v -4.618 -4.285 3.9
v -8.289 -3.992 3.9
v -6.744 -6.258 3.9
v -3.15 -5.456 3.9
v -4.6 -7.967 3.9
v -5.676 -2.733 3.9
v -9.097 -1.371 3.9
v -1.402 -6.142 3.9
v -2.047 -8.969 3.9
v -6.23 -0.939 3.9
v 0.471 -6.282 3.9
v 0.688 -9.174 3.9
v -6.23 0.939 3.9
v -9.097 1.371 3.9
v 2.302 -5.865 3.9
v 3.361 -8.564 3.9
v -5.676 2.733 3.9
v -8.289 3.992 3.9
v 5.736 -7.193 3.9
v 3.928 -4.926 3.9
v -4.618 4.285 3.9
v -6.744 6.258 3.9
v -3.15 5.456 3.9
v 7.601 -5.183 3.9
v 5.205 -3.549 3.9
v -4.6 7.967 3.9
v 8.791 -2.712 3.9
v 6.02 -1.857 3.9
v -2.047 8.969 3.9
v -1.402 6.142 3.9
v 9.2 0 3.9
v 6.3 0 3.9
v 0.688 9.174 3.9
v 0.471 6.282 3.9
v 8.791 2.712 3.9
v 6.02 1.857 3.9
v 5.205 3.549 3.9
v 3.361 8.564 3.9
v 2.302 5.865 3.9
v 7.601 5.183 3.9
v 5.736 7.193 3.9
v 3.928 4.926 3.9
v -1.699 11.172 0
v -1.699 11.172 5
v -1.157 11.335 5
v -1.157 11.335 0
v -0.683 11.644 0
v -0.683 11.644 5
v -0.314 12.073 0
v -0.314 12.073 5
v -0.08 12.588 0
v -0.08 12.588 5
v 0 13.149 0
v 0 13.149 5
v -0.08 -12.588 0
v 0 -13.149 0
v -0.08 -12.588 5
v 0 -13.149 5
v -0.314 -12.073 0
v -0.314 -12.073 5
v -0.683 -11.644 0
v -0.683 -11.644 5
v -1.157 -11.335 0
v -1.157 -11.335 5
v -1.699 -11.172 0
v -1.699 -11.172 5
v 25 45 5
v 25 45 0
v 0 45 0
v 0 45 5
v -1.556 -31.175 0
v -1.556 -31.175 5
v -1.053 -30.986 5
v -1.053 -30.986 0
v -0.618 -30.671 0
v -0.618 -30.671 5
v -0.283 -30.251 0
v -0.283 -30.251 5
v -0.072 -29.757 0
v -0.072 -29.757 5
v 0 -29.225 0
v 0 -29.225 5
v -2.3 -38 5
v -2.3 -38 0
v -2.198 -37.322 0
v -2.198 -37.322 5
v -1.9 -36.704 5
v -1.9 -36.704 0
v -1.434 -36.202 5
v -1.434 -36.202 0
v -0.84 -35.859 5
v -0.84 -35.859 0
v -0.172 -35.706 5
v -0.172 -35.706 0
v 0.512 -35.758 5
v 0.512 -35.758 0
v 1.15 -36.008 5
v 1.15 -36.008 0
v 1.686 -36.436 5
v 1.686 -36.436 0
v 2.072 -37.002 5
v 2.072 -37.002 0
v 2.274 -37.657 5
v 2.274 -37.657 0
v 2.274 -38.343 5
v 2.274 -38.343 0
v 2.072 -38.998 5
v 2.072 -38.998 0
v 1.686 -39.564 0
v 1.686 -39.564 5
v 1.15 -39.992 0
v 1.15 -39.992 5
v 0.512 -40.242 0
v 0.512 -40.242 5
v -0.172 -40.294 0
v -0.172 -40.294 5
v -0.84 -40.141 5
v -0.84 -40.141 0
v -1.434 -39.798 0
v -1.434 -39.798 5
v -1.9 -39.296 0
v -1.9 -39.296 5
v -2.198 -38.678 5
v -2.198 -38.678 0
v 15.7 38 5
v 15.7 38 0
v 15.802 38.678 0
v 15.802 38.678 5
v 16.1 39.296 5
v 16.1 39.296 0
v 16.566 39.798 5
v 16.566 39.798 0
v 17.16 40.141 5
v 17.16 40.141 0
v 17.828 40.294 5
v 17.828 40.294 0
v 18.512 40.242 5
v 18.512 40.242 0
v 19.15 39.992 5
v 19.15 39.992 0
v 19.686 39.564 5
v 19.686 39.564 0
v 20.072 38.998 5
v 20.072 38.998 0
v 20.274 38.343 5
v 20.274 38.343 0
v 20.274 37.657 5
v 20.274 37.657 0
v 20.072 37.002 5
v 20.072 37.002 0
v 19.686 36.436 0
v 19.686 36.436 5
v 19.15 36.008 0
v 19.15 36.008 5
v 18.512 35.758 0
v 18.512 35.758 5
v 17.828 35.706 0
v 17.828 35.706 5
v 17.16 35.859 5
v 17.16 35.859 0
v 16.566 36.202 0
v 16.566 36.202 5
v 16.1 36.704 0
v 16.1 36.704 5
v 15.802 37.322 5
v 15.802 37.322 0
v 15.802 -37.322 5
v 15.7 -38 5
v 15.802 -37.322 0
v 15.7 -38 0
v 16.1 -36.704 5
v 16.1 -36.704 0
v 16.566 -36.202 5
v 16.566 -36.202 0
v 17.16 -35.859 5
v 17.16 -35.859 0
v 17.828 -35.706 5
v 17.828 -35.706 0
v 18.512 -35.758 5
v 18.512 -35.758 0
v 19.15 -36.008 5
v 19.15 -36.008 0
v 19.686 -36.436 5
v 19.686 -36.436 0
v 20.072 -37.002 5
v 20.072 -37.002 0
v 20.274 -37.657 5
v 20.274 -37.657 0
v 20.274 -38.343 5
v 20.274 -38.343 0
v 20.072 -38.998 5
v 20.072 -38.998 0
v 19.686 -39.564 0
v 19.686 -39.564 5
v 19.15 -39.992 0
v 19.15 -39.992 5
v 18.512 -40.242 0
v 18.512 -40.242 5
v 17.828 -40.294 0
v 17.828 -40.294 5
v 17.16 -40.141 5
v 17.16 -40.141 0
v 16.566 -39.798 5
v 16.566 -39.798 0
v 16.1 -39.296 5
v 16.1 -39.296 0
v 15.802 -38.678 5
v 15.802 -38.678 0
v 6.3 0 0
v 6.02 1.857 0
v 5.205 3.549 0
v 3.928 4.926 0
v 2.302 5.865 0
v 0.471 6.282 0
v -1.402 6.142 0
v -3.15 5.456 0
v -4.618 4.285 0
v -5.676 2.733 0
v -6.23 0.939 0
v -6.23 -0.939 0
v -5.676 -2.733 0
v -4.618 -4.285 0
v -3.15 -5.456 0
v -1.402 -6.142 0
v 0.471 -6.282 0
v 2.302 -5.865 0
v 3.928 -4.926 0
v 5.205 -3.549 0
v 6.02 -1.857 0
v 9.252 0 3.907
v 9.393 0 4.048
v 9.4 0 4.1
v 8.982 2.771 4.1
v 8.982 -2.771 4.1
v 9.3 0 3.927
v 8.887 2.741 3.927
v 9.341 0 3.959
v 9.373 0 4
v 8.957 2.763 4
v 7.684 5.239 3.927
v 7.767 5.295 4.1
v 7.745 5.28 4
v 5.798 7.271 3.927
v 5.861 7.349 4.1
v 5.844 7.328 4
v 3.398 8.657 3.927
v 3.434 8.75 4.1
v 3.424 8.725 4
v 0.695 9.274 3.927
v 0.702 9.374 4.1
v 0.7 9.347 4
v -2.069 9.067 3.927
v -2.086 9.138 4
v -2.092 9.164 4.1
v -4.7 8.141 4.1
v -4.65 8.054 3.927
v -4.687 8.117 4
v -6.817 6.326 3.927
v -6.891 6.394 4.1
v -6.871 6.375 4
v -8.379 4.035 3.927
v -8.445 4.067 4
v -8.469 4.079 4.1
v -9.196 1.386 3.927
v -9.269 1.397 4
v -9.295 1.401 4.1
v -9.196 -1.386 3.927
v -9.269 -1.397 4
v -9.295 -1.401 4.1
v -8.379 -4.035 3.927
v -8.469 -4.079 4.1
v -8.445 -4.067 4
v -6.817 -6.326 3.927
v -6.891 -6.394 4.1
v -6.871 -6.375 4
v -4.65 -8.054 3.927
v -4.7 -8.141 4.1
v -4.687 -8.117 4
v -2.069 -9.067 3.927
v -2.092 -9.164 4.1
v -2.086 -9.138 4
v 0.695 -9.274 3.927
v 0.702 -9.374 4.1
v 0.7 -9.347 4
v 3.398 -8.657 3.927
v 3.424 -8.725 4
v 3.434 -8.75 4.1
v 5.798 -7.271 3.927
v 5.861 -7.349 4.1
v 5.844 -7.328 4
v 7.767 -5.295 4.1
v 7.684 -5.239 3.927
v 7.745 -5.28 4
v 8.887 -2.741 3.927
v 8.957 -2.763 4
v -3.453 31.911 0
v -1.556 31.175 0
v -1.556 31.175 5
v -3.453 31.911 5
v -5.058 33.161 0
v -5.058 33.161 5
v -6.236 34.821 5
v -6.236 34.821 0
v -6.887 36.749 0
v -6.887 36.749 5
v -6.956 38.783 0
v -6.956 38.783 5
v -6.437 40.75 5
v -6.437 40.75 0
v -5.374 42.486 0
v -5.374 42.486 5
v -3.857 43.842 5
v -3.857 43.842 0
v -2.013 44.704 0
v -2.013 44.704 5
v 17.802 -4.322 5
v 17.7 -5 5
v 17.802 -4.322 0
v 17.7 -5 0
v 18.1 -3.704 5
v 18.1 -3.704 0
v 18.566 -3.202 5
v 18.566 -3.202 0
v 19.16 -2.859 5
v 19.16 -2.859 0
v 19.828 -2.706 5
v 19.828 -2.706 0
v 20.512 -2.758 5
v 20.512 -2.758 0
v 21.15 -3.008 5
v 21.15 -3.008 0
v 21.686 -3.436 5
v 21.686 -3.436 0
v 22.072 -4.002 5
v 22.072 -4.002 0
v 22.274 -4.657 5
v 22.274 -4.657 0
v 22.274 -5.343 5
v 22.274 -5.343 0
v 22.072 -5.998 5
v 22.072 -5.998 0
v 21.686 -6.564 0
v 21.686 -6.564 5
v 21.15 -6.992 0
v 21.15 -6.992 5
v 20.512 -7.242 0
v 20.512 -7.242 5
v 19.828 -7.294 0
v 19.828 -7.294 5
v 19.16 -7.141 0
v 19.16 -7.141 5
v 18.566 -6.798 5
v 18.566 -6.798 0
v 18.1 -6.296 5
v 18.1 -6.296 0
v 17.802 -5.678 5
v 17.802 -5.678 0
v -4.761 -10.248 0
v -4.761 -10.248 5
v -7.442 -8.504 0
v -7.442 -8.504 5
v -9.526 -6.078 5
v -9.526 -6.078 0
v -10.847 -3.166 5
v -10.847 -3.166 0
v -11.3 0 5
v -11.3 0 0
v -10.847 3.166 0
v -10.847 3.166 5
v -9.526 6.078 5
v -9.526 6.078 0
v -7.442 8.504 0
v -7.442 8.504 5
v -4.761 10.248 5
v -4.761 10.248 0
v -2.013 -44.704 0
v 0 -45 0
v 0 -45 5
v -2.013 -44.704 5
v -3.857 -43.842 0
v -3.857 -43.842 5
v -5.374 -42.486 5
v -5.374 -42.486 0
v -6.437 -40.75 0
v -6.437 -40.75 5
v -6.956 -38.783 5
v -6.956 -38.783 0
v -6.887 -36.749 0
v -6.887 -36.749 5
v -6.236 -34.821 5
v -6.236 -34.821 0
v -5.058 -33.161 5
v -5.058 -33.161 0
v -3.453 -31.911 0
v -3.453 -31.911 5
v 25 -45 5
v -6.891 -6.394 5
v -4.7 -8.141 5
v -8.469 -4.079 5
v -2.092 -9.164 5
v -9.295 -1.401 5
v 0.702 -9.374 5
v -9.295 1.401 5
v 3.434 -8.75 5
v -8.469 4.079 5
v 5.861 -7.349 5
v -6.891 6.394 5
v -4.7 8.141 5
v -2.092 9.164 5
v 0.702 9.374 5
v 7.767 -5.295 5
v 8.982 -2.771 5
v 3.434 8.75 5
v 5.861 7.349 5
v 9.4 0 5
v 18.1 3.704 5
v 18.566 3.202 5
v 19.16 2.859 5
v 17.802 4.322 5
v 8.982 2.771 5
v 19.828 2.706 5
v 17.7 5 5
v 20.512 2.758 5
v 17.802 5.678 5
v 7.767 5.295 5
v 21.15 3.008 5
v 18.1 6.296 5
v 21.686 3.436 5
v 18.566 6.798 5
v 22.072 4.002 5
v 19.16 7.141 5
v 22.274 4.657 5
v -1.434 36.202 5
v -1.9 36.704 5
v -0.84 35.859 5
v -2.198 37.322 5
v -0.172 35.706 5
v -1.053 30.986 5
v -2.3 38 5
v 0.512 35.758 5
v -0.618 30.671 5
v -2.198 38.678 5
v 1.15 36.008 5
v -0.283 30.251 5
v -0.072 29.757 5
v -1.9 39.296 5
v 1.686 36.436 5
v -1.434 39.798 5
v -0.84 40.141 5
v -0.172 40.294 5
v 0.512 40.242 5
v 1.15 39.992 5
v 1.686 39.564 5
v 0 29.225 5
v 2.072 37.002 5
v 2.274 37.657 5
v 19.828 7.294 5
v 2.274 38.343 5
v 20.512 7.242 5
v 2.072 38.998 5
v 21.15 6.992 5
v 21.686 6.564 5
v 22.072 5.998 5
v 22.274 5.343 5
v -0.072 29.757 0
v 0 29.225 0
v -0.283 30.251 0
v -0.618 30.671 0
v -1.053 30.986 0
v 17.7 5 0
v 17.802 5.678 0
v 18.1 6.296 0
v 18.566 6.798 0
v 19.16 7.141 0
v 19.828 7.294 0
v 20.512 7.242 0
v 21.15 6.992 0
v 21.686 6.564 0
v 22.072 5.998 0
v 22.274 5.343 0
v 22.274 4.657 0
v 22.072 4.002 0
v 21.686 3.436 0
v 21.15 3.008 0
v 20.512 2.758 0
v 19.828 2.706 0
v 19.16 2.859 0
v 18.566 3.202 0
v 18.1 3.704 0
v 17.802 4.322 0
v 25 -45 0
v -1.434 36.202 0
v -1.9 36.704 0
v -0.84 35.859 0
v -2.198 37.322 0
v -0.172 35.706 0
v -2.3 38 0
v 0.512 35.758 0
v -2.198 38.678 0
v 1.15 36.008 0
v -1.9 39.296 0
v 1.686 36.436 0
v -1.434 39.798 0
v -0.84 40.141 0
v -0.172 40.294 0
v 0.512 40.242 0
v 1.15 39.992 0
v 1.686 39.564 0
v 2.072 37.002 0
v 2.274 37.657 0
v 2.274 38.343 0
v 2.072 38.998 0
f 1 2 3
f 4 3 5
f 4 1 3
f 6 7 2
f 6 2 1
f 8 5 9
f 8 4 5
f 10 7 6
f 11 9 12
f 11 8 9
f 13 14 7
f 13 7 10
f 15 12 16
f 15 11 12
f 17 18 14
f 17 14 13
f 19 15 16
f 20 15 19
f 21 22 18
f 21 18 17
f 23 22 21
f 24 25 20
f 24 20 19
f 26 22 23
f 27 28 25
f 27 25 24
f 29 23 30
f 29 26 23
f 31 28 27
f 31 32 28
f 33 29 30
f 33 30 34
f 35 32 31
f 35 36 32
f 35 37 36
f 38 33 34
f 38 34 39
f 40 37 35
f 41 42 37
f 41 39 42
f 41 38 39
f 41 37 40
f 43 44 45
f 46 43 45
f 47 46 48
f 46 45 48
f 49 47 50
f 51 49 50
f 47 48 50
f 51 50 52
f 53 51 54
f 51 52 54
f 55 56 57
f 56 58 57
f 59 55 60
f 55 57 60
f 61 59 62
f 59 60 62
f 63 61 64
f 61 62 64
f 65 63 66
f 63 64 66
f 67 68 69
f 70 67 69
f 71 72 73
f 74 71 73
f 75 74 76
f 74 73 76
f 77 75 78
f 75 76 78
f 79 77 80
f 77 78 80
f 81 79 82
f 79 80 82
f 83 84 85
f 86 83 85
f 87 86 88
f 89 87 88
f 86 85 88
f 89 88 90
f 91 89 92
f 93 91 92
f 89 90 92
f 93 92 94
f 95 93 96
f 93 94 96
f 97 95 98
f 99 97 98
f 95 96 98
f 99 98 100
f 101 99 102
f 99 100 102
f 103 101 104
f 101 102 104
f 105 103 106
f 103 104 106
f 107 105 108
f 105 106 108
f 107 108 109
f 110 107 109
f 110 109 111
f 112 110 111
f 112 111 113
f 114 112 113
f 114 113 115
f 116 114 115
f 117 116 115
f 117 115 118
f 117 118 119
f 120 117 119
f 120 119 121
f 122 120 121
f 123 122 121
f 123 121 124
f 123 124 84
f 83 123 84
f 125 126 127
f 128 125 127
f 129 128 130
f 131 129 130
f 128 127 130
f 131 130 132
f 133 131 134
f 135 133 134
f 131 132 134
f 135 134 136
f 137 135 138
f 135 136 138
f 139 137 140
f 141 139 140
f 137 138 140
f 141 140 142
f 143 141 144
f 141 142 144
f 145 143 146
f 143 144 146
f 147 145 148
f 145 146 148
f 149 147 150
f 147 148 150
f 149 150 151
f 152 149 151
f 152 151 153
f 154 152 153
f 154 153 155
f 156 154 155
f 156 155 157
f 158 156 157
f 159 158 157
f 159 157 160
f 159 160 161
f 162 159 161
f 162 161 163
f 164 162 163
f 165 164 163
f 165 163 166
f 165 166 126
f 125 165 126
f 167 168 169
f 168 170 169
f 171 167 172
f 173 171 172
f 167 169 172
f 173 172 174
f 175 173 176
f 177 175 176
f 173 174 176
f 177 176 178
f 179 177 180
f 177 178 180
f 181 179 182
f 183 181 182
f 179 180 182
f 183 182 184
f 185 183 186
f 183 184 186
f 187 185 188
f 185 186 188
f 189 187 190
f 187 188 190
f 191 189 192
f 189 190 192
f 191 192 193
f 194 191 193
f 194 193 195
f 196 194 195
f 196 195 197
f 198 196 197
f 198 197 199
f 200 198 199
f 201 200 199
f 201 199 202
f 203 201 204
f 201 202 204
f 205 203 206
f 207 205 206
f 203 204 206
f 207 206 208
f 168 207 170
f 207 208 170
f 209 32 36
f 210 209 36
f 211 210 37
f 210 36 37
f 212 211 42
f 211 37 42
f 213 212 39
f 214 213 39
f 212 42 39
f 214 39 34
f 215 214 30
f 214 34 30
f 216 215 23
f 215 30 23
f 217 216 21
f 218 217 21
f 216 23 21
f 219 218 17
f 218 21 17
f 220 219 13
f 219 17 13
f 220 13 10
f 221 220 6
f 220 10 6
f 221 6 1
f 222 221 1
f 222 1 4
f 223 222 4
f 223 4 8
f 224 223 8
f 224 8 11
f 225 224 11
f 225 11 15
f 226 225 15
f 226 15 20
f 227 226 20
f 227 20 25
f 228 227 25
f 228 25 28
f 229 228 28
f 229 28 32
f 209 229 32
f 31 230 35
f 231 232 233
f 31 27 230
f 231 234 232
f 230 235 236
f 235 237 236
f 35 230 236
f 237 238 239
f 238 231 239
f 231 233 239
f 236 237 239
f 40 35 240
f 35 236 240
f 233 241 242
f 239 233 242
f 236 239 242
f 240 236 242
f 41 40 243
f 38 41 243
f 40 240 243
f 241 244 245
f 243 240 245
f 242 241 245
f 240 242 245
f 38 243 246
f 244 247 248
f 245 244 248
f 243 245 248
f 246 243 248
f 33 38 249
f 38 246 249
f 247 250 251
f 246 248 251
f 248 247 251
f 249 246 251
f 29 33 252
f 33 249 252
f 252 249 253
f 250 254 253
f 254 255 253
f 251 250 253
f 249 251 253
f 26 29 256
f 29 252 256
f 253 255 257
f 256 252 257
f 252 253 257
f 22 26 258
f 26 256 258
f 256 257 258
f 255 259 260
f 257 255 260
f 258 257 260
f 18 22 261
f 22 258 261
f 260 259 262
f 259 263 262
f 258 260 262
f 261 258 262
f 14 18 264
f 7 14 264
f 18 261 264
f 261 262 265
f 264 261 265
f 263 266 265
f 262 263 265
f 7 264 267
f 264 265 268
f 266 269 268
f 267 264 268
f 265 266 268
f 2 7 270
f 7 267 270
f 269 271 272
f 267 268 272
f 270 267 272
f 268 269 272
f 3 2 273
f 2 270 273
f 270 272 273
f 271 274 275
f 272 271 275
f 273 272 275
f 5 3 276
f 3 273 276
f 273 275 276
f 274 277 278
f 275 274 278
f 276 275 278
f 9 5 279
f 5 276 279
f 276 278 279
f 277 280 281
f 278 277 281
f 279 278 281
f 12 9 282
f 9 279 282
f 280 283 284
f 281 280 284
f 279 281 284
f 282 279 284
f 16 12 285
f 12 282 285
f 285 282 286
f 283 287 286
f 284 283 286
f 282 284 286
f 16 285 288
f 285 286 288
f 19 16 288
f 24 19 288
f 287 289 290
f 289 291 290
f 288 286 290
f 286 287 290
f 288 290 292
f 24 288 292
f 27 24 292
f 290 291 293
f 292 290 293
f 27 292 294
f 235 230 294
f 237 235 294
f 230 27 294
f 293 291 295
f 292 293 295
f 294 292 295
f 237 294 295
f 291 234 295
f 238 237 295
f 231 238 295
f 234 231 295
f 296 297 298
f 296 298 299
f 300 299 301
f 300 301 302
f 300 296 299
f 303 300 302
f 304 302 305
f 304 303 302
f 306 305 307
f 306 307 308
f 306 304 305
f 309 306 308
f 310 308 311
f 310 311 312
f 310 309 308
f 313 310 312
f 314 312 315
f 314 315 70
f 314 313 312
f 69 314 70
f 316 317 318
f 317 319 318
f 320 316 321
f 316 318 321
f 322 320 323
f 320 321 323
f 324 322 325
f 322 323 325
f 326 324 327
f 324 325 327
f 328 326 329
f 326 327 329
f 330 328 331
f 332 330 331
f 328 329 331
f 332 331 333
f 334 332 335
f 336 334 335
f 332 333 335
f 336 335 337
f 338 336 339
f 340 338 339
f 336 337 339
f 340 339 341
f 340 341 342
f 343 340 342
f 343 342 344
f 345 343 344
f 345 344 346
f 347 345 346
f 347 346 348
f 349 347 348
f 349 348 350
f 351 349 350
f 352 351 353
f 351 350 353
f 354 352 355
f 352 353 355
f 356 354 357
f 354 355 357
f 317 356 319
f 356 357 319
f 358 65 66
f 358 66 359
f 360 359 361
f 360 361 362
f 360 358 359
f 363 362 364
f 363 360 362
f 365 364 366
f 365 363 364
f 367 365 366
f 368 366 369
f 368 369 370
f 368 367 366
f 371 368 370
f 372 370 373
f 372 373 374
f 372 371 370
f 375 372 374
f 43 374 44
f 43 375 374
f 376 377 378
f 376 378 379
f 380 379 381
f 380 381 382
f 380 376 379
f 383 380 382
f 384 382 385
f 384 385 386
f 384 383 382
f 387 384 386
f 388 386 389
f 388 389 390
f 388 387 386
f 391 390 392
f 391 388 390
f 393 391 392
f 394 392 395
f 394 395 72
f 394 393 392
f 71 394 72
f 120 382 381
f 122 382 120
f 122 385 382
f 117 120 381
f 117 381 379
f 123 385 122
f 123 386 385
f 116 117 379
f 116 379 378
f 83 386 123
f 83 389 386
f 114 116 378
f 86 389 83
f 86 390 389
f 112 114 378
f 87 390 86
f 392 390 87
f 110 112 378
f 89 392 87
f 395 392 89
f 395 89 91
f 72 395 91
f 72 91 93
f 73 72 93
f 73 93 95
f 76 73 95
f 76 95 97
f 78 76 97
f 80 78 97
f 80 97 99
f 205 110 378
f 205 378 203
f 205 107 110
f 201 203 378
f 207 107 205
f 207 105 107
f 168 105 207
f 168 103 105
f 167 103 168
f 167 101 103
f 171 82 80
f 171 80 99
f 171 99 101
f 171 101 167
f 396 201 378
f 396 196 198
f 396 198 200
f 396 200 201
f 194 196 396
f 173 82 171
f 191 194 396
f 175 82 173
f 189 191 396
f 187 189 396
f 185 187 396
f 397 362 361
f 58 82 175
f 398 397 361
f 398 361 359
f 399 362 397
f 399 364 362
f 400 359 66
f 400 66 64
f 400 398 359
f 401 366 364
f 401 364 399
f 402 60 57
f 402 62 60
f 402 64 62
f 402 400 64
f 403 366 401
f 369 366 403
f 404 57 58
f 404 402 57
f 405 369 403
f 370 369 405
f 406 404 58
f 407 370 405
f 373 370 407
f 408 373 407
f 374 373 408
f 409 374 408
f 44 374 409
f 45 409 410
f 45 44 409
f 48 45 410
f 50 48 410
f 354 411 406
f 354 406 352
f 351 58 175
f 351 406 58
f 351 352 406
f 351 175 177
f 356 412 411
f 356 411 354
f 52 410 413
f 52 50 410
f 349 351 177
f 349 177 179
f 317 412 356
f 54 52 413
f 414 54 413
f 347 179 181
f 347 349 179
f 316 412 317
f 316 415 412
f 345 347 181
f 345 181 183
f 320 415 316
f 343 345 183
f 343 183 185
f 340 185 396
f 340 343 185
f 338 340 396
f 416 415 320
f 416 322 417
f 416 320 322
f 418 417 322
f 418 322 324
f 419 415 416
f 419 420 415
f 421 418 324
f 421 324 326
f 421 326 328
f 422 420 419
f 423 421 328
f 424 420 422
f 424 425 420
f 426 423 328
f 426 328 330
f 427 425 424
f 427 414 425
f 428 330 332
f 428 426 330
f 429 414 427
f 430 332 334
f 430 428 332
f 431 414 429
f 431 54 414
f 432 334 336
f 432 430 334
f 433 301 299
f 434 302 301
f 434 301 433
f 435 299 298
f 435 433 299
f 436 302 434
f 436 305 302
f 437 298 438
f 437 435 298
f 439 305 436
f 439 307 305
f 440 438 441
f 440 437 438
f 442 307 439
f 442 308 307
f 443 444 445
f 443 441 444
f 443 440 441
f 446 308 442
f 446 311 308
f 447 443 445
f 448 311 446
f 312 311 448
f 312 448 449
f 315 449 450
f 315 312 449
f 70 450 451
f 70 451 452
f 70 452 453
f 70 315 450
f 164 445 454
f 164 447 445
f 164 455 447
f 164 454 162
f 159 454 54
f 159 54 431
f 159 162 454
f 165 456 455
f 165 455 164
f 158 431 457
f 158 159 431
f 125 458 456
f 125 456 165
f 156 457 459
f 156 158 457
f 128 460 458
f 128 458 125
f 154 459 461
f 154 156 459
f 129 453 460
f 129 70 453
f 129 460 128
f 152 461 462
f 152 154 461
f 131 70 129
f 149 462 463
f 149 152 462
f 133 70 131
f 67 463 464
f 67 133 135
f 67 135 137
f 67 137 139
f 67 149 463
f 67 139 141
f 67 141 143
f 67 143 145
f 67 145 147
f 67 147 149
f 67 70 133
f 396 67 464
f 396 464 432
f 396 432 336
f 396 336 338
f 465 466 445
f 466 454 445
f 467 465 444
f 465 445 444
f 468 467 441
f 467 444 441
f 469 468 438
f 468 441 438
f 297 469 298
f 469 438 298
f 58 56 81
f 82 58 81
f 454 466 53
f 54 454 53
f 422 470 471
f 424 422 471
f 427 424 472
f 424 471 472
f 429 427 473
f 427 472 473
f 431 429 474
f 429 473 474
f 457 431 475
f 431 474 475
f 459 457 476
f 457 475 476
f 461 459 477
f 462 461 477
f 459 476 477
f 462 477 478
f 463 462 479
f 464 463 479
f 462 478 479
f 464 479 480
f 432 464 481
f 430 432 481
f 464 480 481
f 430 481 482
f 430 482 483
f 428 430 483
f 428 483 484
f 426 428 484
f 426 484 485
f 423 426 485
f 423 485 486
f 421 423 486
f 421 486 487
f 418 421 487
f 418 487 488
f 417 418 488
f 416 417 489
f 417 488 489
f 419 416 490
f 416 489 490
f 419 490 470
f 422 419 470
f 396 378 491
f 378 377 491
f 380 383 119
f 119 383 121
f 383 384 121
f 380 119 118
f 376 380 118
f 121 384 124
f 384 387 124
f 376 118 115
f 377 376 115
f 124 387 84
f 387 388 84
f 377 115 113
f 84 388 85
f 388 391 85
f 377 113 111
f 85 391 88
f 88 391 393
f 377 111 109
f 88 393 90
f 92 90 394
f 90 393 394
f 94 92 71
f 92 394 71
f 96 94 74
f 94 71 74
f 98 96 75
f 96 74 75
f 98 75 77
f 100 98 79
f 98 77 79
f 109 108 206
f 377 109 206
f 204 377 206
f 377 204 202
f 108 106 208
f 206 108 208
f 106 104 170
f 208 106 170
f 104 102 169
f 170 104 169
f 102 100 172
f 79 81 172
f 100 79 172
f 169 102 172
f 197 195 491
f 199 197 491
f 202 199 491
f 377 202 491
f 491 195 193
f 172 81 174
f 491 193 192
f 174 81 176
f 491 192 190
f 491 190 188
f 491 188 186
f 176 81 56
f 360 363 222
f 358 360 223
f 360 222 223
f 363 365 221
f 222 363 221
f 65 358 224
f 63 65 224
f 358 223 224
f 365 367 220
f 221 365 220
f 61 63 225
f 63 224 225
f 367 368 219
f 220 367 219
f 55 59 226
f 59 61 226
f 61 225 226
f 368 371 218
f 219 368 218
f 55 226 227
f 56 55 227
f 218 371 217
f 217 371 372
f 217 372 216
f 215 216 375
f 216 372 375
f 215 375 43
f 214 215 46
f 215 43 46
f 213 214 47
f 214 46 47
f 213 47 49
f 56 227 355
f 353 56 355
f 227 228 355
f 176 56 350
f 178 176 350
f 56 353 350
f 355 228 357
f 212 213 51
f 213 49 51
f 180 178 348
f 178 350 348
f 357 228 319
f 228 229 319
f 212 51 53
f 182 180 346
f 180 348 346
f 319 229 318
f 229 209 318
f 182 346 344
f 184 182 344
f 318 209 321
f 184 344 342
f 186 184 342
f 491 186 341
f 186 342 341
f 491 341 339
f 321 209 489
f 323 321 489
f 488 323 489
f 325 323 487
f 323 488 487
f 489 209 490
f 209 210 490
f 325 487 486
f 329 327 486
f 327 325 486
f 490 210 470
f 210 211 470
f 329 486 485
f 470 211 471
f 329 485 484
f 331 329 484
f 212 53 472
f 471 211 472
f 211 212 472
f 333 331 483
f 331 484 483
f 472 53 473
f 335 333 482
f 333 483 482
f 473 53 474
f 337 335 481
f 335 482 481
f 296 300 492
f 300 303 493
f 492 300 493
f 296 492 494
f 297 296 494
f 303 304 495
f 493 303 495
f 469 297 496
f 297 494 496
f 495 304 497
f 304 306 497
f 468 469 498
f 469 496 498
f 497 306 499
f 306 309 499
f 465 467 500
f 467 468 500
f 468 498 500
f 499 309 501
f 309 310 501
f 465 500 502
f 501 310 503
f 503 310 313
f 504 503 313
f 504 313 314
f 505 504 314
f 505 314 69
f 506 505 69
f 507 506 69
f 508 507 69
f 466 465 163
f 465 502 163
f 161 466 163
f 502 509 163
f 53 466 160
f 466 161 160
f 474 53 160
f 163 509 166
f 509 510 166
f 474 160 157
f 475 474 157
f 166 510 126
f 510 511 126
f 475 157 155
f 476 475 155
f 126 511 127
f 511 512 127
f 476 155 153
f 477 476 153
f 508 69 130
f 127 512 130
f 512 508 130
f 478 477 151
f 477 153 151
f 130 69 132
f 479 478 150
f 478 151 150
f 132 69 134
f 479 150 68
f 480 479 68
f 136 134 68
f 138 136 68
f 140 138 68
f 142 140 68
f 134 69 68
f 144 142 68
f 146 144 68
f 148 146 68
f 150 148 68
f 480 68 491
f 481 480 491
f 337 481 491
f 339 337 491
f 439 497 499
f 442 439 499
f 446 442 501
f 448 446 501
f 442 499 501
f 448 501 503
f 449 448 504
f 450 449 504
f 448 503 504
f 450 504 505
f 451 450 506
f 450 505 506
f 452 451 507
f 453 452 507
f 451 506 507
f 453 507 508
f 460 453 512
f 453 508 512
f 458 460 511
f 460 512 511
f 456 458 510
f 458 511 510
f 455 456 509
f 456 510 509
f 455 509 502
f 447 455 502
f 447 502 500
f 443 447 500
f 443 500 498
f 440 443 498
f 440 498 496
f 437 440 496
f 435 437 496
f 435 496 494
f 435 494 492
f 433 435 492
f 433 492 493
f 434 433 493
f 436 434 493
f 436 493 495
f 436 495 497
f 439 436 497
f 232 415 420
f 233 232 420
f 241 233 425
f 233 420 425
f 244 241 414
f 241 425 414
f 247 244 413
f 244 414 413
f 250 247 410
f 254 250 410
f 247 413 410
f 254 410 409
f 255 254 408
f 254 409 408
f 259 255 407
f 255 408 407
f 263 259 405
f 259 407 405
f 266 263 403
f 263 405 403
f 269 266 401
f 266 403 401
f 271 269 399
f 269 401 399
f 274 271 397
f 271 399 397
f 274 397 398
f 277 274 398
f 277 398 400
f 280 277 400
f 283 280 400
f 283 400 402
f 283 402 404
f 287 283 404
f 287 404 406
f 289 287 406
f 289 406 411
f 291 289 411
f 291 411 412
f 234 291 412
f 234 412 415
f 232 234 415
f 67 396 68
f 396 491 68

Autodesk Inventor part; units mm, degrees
ref_plane "YZ Plane" through (0, 0, 0) normal (1, 0, 0) x (0, 1, 0)
ref_plane "XZ Plane" through (0, 0, 0) normal (0, 1, 0) x (-1, 0, 0)
ref_plane "XY Plane" through (0, 0, 0) normal (0, 0, 1) x (1, 0, 0)
sketch "Sketch1" plane through (0, 0, 0) normal (0, 0, 1) x (1, 0, 0)
  circle A0 centre (0, 0) radius 20
  line L0 (-25, -45) -> (25, -45)
  line L1 (25, -45) -> (25, 45)
  line L2 (25, 45) -> (-25, 45)
  line L3 (-25, 45) -> (-25, -45)
  point P0 (-20, 0)
  point P1 (20, 0)
  dimension "d0" = 40
  dimension "d17" = 90
  dimension "d18" = 50
  dimension "d19" = 25
  dimension "d20" = 45
extrude "Extrusion1" add sketch "Sketch1" along normal blind 5 contours A0 | L3 L2 L1 L0
sketch "Sketch2" plane through (0, 0, 5) normal (0, 0, 1) x (1, 0, 0)
  line L0 (-25, 45) -> (-25, -45) projected
  line L1 (25, 45) -> (-25, 45) projected
  circle A0 centre (0, 0) radius 6.3
  dimension "d37" = 12.6
extrude "Extrusion2" cut sketch "Sketch2" against normal blind 5 from surface at 0
sketch "Sketch3" plane through (0, 0, 5) normal (0, 0, 1) x (1, 0, 0)
  circle A0 centre (0, 0) radius 4.5 projected
  circle A1 centre (0, 0) radius 9.4
  dimension "d6" = 18.8
extrude "Extrusion3" cut sketch "Sketch3" against normal blind 1.1
fillet "Fillet1" radius 0.2 1 edges at (-9.4, 0, 3.9)
sketch "Sketch4" plane through (0, 0, 0) normal (0, 0, -1) x (-1, 0, 0)
  circle A0 centre (18, 38) radius 2.3
  circle A1 centre (-18, 38) radius 2.3
  circle A2 centre (18, -38) radius 2.3
  circle A3 centre (-18, -38) radius 2.3
  line L0 (-25, 45) -> (25, 45) projected
  line L1 (25, -45) -> (-25, -45) projected
  line L2 (25, 45) -> (25, -45) projected
  line L3 (-25, -45) -> (-25, 45) projected
  circle A4 centre (-20, 5) radius 2.3
  circle A5 centre (-20, -5) radius 2.3
  line L4 (-20, 5) -> (-20, -5)
  circle A6 centre (0, 0) radius 6.3 projected
  circle A7 centre (0, 0) radius 11.3
  line L5 (0, 45) -> (0, 11.3) construction
  line L6 (0, -11.3) -> (0, -45) construction
  circle A8 centre (0, 38) radius 2.3
  circle A9 centre (0, -38) radius 2.3
  arc A10 (0, 31) -> (0, 45) centre (0, 38) ccw
  arc A11 (0, -45) -> (0, -31) centre (0, -38) ccw
  line L7 (0, 31) -> (0, 11.3)
  line L8 (0, -11.3) -> (0, -31)
  point P0 (-20, 0)
  dimension "d10" = 4.6
  dimension "d21" = 7
  dimension "d22" = 7
  dimension "d23" = 7
  dimension "d24" = 7
  dimension "d25" = 7
  dimension "d26" = 7
  dimension "d27" = 7
  dimension "d28" = 7
  dimension "d32" = 10
  dimension "d34" = 5
  dimension "d35" = 5
  dimension "d38" = 90
  dimension "d39" = 5
  dimension "d40" = 4.6
  dimension "d41" = 4.6
extrude "Extrusion4" cut sketch "Sketch4" against normal through all contours A0 | A1 | A2 | A3 | L0 L2 L1 A11 L8 A7 L7 A10 | A4 | A5 | A8 | A9
fillet "Fillet3" radius 2 4 edges at (0, 31, 2.5) (0, 11.3, 2.5) (0, -11.3, 2.5) (0, -31, 2.5)
equation "\"d19\" = 0.5 * d18"
equation "\"d20\" = 0.5 * d17"
equation "\"d22\" = d21"
equation "\"d23\" = d21"
equation "\"d24\" = d23"
equation "\"d26\" = d22"
equation "\"d27\" = d24"
equation "\"d28\" = d24"
equation "\"d40\" = d10"
equation "\"d41\" = d10"
properties part number "2113_Nut Stop Plate_V1" material "ABS Plastic"
